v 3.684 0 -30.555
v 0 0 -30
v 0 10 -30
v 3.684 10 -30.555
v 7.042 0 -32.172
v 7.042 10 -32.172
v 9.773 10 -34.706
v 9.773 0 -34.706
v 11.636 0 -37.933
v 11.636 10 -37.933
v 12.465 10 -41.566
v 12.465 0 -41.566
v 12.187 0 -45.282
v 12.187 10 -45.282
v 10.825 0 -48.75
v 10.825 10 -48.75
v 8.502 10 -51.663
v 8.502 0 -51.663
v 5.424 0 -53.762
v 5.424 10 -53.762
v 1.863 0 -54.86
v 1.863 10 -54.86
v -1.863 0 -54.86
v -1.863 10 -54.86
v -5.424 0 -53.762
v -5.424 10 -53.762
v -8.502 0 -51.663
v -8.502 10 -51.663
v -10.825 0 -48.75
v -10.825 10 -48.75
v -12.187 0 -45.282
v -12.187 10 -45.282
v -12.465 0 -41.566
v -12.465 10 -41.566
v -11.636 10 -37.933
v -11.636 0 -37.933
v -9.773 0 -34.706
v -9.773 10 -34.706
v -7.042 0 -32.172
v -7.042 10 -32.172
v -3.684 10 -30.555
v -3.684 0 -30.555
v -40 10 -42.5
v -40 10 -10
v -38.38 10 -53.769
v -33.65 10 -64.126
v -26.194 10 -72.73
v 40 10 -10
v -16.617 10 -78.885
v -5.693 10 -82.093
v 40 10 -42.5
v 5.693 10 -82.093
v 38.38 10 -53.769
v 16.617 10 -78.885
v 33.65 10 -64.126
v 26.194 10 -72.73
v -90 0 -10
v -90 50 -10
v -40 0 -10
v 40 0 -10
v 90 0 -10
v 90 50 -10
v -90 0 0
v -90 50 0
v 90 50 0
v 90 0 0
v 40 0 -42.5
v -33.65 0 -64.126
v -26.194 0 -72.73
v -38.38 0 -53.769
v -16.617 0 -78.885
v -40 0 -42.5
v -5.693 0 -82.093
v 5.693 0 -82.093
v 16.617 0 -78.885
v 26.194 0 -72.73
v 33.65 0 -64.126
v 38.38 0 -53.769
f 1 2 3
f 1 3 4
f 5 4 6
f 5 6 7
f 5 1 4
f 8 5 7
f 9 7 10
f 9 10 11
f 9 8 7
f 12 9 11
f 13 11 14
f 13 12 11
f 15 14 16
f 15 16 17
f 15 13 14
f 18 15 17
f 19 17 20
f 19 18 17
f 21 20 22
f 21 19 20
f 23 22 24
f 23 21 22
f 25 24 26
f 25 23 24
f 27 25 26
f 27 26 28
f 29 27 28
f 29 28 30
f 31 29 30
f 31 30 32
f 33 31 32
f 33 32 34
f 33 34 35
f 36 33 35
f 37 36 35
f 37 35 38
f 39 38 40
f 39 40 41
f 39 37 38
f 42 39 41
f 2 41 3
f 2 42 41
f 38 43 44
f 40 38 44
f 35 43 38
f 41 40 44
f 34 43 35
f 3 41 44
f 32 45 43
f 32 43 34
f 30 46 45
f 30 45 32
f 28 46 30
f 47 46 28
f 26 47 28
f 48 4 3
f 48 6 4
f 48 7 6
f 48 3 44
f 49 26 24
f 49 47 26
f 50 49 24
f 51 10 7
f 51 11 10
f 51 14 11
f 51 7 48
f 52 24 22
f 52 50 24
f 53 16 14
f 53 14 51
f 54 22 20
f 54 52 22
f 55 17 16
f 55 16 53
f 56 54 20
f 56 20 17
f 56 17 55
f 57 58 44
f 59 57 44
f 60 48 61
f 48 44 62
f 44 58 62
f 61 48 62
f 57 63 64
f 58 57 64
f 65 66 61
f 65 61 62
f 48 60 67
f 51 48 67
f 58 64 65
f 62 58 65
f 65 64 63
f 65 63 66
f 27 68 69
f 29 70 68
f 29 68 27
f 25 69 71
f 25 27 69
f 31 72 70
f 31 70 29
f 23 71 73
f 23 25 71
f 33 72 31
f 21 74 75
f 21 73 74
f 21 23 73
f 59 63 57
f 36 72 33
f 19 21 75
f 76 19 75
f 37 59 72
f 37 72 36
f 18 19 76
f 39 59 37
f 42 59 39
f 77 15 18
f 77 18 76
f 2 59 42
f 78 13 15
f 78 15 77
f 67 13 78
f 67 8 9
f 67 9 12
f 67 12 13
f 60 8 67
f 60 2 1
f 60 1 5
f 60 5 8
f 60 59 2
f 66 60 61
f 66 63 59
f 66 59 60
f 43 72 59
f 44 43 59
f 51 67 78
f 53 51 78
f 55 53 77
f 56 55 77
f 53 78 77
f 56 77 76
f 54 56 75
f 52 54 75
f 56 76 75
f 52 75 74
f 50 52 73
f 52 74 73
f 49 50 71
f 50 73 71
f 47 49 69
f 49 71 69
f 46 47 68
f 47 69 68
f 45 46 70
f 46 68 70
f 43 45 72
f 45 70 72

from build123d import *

# Parameters (mm, degrees)
SKETCH1_R           = 12.5
BOSS_EXTRUDE1_DEPTH = 10
SKETCH2_W           = 180
SKETCH2_H           = 50
BOSS_EXTRUDE2_DEPTH = 10


with BuildPart() as part:
    # Sketch1 → Boss-Extrude1 (new body)
    with BuildSketch(Plane(origin=(0, 0, 0), x_dir=(1, 0, 0), z_dir=(0, 1, 0))):
        with BuildLine():
            Line((-40, 0), (40, 0))
            Line((40, 0), (40, 42.5))
            ThreePointArc((40, 42.5), (0, 82.5), (-40, 42.5))
            Line((-40, 42.5), (-40, 0))
        make_face()
        with Locations(Location((0, 42.5, 0), (0, 0, 270))):
            Circle(SKETCH1_R, mode=Mode.SUBTRACT)
    extrude(amount=BOSS_EXTRUDE1_DEPTH)

    # Sketch2 → Boss-Extrude2 (add)
    with BuildSketch(Plane.XY):
        with Locations((0, 25)):
            Rectangle(SKETCH2_W, SKETCH2_H)
    extrude(amount=-BOSS_EXTRUDE2_DEPTH)


solid = part.part
